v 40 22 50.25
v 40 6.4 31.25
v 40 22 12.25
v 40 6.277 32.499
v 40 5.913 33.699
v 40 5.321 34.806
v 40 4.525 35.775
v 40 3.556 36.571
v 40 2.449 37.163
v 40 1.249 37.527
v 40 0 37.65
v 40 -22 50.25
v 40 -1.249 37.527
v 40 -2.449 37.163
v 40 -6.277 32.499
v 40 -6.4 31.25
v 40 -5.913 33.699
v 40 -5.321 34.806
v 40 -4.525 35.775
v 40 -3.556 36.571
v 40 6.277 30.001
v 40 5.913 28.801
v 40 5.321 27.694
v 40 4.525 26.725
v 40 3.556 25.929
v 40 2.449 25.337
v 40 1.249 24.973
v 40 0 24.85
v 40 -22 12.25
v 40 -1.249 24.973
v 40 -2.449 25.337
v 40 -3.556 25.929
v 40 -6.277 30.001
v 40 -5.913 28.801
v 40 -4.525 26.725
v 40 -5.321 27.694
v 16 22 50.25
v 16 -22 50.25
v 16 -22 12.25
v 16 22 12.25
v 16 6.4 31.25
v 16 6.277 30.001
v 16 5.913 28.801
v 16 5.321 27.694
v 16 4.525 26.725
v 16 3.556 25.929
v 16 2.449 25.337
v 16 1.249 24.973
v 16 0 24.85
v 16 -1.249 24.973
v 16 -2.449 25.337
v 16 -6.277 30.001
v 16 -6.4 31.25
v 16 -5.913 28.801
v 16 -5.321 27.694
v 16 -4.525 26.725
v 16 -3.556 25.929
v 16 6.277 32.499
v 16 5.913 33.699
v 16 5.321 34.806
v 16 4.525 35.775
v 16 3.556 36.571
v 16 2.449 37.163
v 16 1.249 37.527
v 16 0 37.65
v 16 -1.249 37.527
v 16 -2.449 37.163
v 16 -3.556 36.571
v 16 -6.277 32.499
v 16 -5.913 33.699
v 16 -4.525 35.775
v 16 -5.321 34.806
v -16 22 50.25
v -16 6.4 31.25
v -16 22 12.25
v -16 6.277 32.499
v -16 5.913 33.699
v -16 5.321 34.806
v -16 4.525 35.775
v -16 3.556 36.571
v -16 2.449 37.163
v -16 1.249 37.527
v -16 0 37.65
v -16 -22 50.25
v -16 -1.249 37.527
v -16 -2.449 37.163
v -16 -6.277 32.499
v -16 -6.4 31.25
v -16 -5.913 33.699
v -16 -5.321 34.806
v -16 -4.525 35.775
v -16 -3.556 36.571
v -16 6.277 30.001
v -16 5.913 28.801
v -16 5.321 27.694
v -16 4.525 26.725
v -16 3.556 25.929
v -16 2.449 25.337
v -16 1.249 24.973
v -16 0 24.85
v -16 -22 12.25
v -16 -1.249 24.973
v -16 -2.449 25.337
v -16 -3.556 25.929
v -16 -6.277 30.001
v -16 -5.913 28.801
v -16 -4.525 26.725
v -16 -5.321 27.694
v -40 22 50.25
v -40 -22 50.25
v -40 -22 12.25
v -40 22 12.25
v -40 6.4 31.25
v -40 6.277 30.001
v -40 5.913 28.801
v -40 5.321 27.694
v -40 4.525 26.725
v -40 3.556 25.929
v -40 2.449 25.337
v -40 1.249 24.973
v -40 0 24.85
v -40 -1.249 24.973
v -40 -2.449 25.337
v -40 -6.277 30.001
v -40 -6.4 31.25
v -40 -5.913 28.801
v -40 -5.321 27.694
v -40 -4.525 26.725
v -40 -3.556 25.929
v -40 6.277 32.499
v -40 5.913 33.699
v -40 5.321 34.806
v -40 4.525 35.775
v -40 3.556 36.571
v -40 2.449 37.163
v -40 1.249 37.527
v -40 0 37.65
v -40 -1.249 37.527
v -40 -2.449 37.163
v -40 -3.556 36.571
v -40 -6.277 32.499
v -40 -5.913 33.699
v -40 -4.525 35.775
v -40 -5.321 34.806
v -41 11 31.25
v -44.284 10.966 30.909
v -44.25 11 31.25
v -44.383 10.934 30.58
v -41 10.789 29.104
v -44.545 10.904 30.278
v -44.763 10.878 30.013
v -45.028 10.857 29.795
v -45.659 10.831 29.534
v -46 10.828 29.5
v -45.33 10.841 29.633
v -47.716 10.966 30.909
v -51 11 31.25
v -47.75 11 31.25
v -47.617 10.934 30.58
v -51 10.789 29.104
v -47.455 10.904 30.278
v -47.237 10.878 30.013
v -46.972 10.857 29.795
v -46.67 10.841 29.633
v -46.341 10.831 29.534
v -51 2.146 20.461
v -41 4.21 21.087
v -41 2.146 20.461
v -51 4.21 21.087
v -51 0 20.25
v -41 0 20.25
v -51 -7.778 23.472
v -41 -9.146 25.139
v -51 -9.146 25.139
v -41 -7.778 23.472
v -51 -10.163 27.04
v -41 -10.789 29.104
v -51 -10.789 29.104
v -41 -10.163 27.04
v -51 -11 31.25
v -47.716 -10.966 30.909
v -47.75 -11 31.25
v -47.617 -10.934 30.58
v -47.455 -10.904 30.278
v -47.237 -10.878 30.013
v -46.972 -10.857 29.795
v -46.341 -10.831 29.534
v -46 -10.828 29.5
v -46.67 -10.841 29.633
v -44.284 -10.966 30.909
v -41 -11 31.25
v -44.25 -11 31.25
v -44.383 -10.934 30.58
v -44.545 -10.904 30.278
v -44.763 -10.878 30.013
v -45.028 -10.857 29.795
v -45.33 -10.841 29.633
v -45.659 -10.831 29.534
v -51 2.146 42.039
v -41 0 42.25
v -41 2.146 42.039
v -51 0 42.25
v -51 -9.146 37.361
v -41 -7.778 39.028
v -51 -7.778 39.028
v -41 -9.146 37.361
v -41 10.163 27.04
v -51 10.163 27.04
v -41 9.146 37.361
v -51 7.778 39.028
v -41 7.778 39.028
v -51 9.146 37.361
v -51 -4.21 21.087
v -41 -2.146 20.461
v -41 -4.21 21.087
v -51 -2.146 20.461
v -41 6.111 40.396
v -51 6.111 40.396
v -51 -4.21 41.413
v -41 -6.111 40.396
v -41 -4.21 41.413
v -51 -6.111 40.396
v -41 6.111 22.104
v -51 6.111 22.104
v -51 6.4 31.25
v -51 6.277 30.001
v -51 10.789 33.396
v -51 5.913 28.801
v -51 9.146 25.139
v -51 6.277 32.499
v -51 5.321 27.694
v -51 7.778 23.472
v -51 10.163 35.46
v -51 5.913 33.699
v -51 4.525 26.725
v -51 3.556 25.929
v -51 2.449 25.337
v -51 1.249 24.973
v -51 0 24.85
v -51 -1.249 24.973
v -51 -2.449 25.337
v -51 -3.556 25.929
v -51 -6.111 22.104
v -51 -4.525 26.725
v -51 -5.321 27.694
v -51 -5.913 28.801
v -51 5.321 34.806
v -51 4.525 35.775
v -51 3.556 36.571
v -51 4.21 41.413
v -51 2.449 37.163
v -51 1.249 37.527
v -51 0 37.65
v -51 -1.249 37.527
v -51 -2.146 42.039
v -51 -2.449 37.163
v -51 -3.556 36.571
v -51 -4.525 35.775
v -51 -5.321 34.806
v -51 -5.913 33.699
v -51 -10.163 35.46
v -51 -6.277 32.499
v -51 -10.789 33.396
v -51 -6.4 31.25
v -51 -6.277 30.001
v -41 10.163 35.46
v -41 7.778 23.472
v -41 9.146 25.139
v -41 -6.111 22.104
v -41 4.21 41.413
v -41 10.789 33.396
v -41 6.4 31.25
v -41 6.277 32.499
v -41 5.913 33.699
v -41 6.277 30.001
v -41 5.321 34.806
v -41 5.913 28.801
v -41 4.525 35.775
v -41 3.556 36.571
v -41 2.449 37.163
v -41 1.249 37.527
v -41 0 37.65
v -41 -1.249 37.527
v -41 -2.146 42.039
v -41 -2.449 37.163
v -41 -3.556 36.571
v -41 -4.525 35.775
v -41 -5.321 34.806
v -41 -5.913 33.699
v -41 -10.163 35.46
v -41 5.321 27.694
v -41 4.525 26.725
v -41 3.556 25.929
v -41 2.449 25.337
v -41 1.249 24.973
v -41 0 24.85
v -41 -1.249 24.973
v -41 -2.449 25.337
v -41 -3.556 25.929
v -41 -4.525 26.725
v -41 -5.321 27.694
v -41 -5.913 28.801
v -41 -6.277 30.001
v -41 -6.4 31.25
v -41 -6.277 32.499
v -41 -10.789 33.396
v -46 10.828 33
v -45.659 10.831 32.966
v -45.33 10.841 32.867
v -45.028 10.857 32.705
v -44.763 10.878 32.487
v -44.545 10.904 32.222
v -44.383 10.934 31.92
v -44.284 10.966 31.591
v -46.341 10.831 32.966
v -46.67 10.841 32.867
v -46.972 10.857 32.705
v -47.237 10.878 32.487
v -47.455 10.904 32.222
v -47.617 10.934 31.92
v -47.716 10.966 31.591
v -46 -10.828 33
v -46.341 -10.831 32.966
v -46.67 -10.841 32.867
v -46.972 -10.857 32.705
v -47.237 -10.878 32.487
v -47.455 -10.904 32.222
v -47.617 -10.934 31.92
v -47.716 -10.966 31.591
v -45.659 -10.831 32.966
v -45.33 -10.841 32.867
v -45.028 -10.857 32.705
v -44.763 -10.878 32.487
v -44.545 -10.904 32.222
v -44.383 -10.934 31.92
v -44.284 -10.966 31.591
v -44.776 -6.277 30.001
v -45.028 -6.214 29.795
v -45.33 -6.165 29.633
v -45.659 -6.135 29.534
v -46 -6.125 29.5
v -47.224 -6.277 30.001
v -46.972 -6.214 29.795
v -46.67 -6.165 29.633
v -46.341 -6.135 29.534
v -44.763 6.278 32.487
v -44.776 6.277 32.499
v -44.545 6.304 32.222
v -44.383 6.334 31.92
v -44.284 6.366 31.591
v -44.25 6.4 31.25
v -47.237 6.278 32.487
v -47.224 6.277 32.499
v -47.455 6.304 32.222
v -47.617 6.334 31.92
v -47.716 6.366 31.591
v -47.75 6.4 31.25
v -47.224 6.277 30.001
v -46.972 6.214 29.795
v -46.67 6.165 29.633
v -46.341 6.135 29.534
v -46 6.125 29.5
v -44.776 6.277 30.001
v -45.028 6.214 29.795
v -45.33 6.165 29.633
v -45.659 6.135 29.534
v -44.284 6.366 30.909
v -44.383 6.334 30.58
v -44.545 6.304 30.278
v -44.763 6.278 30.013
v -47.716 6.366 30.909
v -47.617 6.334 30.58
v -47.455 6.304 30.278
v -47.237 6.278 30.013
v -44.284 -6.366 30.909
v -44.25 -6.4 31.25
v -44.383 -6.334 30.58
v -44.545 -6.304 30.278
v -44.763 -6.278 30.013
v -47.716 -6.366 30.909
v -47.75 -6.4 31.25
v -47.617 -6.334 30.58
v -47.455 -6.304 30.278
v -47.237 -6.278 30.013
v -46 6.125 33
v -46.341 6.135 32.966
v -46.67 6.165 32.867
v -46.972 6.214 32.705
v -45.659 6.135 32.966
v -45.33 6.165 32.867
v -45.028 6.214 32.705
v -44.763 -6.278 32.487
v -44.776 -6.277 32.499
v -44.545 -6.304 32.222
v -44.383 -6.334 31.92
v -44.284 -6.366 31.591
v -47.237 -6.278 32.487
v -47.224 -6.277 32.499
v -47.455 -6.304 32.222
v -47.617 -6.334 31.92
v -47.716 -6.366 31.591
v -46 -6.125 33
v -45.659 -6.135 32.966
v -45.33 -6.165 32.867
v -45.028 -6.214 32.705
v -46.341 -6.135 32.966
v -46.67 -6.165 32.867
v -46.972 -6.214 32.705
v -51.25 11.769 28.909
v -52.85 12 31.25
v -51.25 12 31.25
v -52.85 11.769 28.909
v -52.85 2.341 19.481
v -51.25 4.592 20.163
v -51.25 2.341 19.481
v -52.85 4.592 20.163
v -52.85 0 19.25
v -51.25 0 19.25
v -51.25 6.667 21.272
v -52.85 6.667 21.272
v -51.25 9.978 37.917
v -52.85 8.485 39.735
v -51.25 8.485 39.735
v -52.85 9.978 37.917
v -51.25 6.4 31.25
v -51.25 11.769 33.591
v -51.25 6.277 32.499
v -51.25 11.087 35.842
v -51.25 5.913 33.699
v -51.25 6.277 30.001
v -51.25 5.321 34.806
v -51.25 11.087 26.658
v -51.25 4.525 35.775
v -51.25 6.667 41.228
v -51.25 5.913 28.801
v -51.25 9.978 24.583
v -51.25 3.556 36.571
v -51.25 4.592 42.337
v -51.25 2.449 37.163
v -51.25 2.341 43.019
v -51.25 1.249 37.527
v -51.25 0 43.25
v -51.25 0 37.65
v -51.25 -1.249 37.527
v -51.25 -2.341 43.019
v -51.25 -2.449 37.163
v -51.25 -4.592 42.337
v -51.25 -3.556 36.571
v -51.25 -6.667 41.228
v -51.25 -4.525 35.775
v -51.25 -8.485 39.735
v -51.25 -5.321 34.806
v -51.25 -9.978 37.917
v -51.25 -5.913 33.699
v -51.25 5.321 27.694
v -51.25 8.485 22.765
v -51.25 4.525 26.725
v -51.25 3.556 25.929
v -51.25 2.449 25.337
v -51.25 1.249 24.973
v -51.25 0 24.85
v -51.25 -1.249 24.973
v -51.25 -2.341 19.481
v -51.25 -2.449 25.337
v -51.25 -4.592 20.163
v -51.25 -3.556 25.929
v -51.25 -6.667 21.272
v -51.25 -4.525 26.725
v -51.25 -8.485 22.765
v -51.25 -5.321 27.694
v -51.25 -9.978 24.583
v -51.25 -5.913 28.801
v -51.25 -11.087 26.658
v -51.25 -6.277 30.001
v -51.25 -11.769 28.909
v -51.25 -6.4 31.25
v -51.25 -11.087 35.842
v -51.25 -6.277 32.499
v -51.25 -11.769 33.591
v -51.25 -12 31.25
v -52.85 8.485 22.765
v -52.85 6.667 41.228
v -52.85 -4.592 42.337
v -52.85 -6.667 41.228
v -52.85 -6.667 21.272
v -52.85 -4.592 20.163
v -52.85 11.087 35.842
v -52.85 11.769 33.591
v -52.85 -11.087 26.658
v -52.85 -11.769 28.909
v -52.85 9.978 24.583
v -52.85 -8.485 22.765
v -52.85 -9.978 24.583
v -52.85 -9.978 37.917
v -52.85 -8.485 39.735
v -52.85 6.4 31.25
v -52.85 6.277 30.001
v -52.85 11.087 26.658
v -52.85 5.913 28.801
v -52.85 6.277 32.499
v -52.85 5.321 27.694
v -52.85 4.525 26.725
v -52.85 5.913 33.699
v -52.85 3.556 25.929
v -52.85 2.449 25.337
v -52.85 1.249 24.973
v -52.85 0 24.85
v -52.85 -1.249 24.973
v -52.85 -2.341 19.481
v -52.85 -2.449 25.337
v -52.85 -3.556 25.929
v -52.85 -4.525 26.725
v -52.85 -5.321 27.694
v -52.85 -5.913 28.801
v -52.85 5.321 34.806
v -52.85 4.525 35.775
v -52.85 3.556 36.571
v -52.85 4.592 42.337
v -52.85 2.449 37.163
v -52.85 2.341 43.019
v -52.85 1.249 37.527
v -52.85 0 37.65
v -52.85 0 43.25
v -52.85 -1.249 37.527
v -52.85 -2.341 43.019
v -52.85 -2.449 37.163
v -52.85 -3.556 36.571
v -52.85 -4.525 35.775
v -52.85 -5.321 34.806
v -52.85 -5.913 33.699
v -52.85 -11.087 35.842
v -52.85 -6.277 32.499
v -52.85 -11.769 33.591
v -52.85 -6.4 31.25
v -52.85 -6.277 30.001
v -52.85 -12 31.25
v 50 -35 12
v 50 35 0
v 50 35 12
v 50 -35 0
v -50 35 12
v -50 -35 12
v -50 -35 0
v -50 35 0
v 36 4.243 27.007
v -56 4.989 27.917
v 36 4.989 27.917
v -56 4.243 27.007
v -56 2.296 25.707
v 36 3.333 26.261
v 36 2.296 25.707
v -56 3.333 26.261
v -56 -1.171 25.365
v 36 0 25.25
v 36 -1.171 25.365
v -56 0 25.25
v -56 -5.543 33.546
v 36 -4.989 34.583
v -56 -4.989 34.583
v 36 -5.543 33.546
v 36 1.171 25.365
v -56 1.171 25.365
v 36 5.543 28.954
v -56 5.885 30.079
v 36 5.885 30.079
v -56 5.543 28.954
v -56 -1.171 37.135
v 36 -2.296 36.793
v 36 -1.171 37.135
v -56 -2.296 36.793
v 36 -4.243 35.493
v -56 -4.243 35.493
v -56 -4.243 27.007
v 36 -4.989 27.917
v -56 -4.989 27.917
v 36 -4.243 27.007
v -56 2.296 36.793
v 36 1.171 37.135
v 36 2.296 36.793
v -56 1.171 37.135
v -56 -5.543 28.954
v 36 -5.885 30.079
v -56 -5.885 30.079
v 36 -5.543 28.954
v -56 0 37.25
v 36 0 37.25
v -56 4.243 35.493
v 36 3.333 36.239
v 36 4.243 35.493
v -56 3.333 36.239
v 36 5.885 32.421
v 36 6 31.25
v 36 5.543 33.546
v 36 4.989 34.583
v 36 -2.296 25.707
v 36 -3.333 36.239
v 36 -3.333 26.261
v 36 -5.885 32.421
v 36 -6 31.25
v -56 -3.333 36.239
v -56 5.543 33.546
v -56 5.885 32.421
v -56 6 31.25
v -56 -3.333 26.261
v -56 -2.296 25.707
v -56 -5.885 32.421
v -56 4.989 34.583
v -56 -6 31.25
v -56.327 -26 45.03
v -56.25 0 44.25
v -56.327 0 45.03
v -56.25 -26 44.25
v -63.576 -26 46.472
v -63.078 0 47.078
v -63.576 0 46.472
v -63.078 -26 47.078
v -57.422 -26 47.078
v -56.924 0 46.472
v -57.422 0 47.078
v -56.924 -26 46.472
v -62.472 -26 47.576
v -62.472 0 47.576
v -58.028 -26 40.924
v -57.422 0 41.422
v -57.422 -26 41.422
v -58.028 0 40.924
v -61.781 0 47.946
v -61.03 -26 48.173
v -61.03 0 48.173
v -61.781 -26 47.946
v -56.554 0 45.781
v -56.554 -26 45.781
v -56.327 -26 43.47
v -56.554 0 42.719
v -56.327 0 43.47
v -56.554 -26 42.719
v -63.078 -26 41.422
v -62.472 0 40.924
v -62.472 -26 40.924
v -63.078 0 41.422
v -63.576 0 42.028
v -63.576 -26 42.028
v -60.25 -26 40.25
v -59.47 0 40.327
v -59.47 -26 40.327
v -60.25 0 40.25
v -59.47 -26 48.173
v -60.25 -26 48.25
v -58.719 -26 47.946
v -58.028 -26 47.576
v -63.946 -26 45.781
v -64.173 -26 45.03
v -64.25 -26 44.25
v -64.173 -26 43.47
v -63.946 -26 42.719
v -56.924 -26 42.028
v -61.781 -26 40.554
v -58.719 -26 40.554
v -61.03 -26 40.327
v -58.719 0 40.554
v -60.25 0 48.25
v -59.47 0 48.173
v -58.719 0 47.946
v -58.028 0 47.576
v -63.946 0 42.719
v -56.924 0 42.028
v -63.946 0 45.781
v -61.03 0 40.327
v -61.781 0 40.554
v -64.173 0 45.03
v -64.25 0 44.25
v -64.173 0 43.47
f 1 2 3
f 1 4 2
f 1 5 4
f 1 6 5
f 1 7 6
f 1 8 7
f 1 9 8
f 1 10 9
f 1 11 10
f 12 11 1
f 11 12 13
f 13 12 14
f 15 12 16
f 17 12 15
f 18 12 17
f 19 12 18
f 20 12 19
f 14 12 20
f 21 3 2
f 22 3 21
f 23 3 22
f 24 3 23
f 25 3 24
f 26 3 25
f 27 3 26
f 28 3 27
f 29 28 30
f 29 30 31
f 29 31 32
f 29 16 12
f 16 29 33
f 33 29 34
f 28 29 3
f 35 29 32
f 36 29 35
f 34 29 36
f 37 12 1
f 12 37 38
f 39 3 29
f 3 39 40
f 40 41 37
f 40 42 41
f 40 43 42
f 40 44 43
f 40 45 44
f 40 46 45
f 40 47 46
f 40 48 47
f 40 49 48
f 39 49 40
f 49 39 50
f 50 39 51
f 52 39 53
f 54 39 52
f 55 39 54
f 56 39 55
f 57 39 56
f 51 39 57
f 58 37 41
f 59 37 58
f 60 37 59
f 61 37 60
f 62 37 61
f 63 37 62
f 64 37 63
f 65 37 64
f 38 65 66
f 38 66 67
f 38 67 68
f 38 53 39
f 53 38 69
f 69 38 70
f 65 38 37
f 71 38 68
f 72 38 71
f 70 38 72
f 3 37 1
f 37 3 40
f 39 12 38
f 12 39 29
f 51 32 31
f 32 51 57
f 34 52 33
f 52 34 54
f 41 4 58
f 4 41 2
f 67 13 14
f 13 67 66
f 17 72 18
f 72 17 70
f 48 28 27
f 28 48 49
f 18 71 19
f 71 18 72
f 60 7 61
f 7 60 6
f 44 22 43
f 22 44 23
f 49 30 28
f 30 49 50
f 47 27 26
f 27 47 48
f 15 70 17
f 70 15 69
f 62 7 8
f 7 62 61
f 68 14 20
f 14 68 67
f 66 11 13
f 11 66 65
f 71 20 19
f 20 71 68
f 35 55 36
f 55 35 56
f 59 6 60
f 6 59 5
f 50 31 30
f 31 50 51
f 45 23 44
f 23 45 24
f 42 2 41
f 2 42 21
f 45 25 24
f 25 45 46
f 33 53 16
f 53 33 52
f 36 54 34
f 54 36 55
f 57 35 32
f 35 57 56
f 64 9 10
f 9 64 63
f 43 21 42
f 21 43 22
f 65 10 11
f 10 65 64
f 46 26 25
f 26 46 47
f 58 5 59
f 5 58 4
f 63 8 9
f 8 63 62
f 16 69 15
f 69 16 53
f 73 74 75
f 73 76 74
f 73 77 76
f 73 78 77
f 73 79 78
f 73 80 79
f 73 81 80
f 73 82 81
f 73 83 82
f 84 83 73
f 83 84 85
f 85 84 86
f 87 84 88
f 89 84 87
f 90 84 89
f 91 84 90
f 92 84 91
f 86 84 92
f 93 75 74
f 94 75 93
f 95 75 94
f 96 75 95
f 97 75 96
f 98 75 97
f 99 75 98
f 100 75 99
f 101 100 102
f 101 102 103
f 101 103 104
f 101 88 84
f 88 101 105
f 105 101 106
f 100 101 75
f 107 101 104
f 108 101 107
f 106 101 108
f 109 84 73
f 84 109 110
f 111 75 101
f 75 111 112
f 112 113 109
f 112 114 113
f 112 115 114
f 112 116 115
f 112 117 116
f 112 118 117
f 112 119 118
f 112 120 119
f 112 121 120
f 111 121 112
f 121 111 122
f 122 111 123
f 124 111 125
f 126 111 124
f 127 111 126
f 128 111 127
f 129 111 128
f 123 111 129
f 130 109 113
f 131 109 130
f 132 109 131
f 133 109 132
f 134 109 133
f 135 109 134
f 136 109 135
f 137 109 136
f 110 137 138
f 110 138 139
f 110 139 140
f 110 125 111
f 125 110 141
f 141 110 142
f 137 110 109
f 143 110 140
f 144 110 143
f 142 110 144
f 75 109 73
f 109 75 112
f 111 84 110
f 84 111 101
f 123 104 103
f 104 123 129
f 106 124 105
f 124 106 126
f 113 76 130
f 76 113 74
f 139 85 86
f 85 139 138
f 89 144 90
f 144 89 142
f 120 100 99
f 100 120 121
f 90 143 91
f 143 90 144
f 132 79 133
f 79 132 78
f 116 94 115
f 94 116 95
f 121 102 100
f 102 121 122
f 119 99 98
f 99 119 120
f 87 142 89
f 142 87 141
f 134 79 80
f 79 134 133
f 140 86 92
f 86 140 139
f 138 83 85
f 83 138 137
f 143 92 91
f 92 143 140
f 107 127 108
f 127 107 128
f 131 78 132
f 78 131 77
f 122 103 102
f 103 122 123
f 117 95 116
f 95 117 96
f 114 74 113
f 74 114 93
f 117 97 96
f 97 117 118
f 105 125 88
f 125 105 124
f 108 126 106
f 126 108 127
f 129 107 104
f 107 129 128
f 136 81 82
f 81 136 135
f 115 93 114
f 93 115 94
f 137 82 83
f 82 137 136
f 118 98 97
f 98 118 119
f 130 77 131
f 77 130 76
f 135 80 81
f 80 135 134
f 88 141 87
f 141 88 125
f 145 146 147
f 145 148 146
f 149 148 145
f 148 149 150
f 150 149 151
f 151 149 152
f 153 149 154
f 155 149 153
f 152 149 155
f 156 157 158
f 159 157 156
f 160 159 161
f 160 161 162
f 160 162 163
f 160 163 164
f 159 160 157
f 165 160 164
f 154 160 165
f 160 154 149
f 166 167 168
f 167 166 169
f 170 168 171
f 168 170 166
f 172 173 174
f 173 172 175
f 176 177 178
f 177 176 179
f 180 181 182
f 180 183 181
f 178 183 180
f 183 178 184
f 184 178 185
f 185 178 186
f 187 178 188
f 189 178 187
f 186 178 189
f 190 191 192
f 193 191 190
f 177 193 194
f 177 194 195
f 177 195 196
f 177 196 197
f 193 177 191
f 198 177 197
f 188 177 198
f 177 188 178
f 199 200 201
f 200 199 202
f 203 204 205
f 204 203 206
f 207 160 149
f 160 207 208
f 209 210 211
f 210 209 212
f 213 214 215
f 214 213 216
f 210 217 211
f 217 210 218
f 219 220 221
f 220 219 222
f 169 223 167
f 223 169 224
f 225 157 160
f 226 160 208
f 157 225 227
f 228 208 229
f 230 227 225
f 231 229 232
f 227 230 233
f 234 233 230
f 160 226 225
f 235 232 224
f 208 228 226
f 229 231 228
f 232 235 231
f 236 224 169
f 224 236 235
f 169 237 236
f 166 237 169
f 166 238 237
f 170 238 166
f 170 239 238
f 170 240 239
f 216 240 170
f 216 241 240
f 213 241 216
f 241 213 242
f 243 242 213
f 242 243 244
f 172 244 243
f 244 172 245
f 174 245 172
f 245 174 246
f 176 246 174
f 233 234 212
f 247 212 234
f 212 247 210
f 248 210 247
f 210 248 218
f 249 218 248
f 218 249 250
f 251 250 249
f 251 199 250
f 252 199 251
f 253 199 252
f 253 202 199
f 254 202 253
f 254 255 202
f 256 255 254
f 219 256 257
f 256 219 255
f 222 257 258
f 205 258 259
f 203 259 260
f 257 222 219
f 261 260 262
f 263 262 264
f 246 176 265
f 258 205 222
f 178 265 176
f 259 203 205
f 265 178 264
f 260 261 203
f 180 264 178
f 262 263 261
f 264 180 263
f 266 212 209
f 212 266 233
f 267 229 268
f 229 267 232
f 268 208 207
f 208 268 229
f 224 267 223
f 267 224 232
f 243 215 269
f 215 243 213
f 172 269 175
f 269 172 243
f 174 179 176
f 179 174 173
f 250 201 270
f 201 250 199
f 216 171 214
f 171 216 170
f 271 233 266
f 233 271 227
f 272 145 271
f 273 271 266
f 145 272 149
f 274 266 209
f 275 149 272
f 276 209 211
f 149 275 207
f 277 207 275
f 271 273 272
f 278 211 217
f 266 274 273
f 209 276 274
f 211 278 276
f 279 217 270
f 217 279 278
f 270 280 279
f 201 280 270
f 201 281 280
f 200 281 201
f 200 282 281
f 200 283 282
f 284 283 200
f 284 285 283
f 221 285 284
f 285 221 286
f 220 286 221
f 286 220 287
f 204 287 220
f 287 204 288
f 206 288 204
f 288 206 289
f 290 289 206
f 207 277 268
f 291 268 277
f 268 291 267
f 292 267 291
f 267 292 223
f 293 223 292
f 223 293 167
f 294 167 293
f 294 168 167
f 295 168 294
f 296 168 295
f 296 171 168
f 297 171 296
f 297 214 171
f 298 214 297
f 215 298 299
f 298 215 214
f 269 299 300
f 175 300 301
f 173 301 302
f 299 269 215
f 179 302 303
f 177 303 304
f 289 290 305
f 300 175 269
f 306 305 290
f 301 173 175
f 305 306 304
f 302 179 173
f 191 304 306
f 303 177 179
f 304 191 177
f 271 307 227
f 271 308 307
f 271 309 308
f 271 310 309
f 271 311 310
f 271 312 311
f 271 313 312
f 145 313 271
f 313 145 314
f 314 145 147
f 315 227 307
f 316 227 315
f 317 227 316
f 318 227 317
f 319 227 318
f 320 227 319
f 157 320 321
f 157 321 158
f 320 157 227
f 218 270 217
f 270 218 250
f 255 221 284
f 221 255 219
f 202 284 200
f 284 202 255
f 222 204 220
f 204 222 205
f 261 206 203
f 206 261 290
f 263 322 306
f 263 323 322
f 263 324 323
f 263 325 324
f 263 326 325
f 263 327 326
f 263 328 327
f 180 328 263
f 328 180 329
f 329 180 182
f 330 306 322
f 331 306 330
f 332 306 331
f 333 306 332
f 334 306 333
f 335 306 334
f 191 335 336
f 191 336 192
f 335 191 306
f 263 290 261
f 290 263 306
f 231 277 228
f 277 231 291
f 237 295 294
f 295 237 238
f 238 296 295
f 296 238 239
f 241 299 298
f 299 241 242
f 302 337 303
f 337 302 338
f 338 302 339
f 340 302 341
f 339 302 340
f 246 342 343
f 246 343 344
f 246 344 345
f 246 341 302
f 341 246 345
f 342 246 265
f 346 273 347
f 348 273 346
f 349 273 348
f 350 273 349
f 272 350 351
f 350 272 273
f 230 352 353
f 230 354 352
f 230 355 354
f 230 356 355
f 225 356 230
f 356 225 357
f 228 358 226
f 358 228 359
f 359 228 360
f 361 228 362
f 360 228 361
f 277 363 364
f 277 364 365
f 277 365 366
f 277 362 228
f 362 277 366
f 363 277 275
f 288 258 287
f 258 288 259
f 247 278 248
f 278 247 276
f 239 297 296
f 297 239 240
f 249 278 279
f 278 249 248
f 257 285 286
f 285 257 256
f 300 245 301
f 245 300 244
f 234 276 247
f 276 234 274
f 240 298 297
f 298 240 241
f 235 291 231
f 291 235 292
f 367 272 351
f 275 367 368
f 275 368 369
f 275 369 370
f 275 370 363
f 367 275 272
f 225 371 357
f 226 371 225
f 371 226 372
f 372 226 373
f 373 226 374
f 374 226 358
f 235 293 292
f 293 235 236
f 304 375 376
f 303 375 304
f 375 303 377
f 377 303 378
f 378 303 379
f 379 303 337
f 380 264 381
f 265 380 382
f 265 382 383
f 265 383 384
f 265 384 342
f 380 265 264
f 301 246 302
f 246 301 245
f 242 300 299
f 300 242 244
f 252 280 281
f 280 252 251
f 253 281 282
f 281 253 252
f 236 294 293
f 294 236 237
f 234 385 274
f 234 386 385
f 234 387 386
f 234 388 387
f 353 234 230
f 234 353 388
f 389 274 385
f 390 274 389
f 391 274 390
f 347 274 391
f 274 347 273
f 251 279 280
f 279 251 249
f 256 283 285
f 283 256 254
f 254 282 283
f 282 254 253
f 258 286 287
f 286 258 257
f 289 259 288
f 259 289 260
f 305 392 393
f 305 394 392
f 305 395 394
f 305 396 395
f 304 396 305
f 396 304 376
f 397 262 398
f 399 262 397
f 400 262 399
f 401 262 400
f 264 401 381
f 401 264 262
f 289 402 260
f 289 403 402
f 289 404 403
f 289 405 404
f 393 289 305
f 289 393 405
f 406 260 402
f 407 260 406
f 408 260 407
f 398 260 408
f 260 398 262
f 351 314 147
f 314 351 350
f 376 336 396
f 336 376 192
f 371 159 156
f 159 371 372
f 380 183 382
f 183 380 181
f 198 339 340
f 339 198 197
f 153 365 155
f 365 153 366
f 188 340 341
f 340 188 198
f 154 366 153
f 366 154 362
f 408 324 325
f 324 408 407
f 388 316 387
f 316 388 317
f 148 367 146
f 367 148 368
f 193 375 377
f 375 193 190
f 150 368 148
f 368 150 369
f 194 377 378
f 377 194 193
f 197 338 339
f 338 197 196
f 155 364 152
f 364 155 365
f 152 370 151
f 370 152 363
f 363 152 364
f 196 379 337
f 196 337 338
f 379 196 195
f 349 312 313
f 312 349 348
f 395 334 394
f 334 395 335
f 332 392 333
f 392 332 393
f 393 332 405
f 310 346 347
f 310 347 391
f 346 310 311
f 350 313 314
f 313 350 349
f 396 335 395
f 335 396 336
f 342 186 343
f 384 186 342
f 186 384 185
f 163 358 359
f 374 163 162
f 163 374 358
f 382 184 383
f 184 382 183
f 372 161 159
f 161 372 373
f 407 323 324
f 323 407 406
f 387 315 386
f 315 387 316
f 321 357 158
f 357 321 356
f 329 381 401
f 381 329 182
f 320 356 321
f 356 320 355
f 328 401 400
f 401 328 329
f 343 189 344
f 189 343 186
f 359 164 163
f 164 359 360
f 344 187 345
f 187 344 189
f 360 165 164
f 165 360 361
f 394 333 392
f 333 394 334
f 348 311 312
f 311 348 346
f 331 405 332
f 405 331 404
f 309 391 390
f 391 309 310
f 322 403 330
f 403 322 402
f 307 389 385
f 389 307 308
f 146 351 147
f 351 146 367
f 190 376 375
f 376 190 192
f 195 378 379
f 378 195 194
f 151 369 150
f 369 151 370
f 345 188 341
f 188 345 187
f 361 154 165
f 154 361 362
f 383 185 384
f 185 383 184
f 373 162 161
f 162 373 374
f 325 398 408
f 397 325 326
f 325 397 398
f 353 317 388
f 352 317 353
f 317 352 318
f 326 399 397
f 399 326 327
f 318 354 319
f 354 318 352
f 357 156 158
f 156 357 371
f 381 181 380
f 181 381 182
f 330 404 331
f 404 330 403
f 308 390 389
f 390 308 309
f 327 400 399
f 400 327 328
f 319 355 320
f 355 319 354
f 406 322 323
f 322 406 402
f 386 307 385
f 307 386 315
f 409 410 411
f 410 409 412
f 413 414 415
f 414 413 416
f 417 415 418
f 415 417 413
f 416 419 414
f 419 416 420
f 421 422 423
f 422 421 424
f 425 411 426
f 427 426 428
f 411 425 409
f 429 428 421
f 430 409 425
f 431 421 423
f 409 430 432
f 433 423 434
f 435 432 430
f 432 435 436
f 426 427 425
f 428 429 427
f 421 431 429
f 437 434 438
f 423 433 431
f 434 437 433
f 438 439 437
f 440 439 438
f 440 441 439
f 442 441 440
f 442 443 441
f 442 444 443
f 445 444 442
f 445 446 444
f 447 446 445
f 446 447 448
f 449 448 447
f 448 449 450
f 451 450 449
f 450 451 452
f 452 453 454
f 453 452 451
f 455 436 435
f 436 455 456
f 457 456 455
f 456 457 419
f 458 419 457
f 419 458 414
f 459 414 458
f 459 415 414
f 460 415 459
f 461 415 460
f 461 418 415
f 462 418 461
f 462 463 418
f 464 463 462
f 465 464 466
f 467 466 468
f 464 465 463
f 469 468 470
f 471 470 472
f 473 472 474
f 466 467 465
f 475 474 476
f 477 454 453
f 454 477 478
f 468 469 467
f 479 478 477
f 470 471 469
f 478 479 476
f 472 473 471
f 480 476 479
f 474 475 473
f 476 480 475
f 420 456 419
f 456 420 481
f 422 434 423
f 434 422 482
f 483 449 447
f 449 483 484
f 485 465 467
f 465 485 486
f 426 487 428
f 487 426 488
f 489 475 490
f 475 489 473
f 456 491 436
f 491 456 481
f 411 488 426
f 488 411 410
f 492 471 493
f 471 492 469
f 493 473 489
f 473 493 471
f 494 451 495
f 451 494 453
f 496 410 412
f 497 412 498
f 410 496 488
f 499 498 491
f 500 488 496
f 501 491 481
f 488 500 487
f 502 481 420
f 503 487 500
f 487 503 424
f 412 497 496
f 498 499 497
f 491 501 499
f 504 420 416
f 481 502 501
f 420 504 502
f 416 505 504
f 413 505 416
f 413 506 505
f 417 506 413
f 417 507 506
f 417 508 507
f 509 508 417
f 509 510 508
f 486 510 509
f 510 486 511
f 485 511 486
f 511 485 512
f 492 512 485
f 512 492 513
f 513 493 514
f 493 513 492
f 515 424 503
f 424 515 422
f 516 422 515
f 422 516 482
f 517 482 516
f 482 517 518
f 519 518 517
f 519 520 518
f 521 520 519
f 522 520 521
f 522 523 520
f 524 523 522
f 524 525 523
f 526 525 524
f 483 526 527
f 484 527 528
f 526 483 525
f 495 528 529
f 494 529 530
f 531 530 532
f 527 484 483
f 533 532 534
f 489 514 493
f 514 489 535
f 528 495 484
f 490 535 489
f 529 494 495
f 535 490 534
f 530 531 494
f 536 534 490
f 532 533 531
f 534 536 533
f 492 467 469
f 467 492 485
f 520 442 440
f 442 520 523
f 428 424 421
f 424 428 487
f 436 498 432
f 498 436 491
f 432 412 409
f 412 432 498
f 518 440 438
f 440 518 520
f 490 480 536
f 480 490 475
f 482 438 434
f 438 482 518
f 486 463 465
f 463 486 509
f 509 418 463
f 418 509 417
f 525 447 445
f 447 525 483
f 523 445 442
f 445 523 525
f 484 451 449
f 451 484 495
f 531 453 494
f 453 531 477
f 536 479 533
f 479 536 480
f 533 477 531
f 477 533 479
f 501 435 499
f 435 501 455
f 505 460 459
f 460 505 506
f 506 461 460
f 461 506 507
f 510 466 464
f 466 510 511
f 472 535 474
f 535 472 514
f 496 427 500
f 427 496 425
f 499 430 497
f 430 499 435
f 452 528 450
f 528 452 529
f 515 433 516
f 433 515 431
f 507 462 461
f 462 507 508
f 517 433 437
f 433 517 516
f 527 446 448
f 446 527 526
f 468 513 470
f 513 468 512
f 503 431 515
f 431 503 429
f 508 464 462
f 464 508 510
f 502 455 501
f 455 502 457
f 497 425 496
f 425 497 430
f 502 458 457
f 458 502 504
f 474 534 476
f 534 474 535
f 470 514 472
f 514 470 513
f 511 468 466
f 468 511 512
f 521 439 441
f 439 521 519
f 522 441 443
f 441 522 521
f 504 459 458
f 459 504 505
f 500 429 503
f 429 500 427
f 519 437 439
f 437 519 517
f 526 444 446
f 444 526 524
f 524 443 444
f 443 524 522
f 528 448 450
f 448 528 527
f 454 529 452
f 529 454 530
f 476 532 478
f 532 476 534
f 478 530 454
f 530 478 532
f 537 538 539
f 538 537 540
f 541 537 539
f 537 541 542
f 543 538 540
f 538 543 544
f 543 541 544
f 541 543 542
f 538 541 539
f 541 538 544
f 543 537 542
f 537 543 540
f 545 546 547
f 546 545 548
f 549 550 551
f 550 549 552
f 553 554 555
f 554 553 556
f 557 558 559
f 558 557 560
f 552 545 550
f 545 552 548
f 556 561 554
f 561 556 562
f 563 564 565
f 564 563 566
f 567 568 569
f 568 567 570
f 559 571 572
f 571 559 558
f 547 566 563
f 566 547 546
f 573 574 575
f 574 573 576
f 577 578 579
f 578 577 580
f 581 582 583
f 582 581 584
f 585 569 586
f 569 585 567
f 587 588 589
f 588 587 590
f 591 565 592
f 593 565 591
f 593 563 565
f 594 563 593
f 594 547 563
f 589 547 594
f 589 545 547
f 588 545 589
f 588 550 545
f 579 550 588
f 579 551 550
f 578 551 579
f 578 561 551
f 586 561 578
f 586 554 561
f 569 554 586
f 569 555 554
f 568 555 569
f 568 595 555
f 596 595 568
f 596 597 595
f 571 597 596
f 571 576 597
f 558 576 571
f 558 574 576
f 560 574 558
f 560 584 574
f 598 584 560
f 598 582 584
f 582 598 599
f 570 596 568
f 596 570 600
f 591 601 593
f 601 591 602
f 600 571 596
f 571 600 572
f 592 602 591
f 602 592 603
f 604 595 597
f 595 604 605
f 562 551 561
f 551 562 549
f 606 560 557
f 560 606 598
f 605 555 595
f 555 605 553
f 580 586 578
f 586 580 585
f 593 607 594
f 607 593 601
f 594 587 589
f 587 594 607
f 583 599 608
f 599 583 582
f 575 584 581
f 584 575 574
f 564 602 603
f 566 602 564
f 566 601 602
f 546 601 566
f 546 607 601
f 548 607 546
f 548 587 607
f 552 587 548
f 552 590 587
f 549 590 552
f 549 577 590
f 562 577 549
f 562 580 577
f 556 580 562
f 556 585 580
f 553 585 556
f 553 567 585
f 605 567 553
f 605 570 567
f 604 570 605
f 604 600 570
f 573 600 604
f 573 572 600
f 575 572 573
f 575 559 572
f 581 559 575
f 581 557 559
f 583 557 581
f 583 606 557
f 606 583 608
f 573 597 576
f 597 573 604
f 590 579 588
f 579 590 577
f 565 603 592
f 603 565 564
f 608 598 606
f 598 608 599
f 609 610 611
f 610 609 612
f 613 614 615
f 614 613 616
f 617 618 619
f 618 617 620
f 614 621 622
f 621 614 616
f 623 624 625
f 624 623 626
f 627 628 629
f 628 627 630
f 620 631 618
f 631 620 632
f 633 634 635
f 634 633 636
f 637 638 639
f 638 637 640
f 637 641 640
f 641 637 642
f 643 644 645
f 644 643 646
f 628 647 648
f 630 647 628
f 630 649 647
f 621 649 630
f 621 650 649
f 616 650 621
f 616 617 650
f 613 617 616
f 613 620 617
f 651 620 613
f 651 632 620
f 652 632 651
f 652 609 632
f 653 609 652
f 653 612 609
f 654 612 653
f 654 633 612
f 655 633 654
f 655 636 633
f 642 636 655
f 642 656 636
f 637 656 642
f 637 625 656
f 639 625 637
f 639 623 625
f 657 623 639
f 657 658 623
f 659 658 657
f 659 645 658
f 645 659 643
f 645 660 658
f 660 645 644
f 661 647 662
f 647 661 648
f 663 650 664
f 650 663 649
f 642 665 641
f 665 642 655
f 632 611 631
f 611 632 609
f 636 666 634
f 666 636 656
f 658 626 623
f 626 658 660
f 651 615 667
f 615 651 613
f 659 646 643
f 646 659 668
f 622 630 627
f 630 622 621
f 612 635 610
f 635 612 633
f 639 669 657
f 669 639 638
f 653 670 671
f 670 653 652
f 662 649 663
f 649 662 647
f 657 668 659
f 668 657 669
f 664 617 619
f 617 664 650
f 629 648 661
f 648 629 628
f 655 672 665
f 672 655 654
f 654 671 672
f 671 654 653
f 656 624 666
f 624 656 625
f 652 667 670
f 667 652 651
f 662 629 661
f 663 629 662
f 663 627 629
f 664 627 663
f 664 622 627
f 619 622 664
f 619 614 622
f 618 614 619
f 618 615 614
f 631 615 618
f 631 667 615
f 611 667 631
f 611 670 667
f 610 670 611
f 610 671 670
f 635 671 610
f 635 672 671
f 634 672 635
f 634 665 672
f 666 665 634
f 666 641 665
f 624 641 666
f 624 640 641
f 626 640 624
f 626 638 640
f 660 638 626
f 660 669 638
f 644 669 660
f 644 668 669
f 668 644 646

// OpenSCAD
$fn = 32;

// ------------------------------------------------------------------------
// Machine vise: screw d12, jaws 24 x 38 mm
// Every part is its own module, assembly() places every instance.
// ------------------------------------------------------------------------

// --- part 1 ---
module vise_bed() {
  difference() {
    translate([-50, -35, 0]) cube([100, 70, 12]);
  }
}

// --- part 2 ---
module vise_jaw() {
  difference() {
    translate([-12, -22, 0]) cube([24, 44, 38]);
    translate([0, 0, 19]) rotate([0, 90, 0]) cylinder(h = 26, d = 12.8, center = true);
  }
}

// --- part 3 ---
module vise_screw() {
  translate([0, 0, -46]) cylinder(h = 92, d = 12);
}

// --- part 4 ---
module screw_collar() {
  difference() {
    cylinder(h = 10, d = 22);
    translate([0, 0, -1]) cylinder(h = 12, d = 12.8);
    translate([0, 0, 5]) rotate([90, 0, 0]) cylinder(h = 24, d = 3.5, center = true);
  }
}

// --- part 5 ---
module screw_washer() {
  difference() {
      translate([0, 0, 0]) cylinder(h = 1.6, d = 24);
      translate([0, 0, -1]) cylinder(h = 3.6, d = 12.8);
    }
}

// --- part 6 ---
module vise_handle() {
  cylinder(h = 26, d = 8);
}

// --- assembly ---
module assembly() {
  color([0.80, 0.24, 0.20]) translate([0, 0, 0]) rotate([0, 0, 0]) vise_bed();
  color([0.20, 0.45, 0.75]) translate([28, 0, 12.25]) rotate([0, 0, 0]) vise_jaw();
  color([0.25, 0.62, 0.32]) translate([-28, 0, 12.25]) rotate([0, 0, 0]) vise_jaw();
  color([0.92, 0.70, 0.18]) translate([-10, 0, 31.25]) rotate([0, 90, 0]) vise_screw();
  color([0.58, 0.35, 0.70]) translate([-51, 0, 31.25]) rotate([0, 90, 0]) screw_collar();
  color([0.16, 0.66, 0.66]) translate([-52.85, 0, 31.25]) rotate([0, 90, 0]) screw_washer();
  color([0.85, 0.48, 0.18]) translate([-60.25, 0, 44.25]) rotate([90, 0, 0]) vise_handle();
}

assembly();
